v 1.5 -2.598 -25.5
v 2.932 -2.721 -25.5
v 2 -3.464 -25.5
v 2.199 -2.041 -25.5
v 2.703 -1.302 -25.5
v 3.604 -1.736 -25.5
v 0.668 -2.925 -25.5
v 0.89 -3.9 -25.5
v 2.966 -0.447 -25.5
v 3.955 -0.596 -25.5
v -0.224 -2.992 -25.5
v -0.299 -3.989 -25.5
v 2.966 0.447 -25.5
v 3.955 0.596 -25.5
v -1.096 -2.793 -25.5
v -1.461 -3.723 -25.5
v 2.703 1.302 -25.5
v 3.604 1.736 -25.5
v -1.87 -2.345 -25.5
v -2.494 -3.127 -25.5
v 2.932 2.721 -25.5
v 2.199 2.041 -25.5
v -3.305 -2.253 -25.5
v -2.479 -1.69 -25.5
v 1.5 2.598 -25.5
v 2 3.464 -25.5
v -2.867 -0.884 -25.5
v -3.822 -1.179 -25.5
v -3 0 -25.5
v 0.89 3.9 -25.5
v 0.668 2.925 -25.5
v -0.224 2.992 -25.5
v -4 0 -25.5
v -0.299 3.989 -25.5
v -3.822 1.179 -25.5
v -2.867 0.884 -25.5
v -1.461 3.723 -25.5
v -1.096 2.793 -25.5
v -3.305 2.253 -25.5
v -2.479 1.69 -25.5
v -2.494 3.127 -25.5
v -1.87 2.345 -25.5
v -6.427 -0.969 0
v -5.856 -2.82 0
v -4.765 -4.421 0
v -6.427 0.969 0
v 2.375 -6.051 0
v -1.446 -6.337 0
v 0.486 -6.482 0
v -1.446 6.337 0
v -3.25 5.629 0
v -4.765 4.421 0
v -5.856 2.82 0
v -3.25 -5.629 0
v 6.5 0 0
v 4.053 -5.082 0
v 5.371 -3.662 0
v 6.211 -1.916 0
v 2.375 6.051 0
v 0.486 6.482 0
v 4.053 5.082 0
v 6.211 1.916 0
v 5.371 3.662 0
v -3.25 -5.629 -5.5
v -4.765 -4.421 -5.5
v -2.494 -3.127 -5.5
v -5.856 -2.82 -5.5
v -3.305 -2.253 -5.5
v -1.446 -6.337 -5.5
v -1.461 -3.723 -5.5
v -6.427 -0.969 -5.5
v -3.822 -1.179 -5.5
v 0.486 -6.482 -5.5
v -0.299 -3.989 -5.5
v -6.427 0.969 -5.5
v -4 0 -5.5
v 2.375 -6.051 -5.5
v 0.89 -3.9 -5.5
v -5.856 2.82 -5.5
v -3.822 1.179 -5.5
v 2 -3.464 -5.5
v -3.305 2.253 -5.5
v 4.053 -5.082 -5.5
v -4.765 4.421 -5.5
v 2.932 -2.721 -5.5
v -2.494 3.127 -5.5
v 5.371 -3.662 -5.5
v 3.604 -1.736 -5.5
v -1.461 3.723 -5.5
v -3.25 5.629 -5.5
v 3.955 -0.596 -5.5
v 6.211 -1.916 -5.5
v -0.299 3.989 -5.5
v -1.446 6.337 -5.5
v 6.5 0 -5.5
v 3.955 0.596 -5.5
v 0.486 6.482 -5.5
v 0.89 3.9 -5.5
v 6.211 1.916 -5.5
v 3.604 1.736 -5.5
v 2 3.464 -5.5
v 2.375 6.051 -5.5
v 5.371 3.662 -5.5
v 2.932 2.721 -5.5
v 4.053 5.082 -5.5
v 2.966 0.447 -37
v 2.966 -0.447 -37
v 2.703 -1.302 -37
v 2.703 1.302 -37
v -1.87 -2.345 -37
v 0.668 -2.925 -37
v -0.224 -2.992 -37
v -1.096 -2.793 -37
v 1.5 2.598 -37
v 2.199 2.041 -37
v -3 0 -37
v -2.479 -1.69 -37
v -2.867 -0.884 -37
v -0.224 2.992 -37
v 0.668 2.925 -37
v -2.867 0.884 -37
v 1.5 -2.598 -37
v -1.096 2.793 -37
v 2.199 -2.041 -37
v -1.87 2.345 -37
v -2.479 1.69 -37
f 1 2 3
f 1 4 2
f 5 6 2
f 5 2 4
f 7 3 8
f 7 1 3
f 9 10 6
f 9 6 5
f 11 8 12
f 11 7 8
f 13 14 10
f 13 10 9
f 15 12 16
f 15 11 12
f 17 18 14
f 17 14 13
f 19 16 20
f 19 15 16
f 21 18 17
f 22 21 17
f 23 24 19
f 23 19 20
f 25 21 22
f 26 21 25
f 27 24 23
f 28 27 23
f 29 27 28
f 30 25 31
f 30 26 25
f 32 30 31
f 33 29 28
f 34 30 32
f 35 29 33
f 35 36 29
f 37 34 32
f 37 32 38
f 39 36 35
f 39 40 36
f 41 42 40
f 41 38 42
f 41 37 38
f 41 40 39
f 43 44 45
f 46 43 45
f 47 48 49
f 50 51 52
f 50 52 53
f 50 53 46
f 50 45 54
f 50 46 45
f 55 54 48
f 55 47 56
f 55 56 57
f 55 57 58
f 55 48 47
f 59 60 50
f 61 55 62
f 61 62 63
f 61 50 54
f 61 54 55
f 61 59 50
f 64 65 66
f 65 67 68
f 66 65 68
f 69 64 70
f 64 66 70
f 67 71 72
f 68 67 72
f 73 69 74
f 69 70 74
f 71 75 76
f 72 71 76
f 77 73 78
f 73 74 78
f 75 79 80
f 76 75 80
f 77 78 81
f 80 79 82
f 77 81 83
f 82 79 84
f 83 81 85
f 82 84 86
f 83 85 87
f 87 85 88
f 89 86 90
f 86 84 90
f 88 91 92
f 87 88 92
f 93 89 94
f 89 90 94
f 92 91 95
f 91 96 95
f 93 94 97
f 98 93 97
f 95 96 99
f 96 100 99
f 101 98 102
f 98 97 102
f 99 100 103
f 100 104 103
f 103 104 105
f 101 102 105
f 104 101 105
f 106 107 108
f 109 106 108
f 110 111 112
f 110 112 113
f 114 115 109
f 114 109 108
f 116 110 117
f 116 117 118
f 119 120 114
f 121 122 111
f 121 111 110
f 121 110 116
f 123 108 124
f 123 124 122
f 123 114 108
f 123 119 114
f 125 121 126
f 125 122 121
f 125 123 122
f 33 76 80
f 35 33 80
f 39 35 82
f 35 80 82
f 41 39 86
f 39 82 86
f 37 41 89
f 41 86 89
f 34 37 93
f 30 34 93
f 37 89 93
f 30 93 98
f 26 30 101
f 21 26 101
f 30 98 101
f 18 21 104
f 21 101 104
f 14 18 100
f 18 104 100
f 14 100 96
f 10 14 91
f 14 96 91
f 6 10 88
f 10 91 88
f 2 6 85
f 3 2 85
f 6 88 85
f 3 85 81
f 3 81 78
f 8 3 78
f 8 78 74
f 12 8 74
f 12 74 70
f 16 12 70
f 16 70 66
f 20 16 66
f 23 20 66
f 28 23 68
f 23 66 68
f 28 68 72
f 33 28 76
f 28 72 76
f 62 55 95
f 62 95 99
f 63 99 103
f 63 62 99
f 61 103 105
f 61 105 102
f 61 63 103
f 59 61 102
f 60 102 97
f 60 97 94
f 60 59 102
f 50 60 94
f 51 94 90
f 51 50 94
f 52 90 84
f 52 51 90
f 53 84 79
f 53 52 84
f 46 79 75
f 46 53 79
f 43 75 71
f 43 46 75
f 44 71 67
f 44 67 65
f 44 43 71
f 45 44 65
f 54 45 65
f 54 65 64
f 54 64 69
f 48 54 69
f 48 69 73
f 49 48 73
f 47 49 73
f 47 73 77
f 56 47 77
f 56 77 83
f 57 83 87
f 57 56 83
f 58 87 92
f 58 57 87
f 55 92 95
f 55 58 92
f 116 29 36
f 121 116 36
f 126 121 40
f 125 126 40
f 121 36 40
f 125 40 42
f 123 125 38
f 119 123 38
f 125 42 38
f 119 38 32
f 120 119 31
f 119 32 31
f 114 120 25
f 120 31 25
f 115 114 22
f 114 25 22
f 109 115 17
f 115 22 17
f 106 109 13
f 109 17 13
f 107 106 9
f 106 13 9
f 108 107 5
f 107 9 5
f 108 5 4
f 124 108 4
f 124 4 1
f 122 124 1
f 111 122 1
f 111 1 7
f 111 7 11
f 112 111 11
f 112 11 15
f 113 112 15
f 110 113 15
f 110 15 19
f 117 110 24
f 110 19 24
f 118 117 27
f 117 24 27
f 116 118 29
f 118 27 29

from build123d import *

# Parameters (mm, degrees)
SKETCH_1_R      = 6.5
EXTRUDE_1_DEPTH = 5.5
SKETCH_2_R      = 4
EXTRUDE_2_DEPTH = 20
SKETCH_3_R      = 3
EXTRUDE_3_DEPTH = 11.5


with BuildPart() as part:
    # 草图1 → 凸台-拉伸1 (new body)
    with BuildSketch(Plane.XY):
        Circle(SKETCH_1_R)
    extrude(amount=-EXTRUDE_1_DEPTH)

    # 草图2 → 凸台-拉伸2 (add)
    with BuildSketch(Plane(origin=(0, 0, -5.5), x_dir=(-1, 0, 0), z_dir=(0, 0, -1))):
        Circle(SKETCH_2_R)
    extrude(amount=EXTRUDE_2_DEPTH)

    # 草图3 → 凸台-拉伸3 (add)
    with BuildSketch(Plane(origin=(0, 0, -25.5), x_dir=(-1, 0, 0), z_dir=(0, 0, -1))):
        Circle(SKETCH_3_R)
    extrude(amount=EXTRUDE_3_DEPTH)


solid = part.part
